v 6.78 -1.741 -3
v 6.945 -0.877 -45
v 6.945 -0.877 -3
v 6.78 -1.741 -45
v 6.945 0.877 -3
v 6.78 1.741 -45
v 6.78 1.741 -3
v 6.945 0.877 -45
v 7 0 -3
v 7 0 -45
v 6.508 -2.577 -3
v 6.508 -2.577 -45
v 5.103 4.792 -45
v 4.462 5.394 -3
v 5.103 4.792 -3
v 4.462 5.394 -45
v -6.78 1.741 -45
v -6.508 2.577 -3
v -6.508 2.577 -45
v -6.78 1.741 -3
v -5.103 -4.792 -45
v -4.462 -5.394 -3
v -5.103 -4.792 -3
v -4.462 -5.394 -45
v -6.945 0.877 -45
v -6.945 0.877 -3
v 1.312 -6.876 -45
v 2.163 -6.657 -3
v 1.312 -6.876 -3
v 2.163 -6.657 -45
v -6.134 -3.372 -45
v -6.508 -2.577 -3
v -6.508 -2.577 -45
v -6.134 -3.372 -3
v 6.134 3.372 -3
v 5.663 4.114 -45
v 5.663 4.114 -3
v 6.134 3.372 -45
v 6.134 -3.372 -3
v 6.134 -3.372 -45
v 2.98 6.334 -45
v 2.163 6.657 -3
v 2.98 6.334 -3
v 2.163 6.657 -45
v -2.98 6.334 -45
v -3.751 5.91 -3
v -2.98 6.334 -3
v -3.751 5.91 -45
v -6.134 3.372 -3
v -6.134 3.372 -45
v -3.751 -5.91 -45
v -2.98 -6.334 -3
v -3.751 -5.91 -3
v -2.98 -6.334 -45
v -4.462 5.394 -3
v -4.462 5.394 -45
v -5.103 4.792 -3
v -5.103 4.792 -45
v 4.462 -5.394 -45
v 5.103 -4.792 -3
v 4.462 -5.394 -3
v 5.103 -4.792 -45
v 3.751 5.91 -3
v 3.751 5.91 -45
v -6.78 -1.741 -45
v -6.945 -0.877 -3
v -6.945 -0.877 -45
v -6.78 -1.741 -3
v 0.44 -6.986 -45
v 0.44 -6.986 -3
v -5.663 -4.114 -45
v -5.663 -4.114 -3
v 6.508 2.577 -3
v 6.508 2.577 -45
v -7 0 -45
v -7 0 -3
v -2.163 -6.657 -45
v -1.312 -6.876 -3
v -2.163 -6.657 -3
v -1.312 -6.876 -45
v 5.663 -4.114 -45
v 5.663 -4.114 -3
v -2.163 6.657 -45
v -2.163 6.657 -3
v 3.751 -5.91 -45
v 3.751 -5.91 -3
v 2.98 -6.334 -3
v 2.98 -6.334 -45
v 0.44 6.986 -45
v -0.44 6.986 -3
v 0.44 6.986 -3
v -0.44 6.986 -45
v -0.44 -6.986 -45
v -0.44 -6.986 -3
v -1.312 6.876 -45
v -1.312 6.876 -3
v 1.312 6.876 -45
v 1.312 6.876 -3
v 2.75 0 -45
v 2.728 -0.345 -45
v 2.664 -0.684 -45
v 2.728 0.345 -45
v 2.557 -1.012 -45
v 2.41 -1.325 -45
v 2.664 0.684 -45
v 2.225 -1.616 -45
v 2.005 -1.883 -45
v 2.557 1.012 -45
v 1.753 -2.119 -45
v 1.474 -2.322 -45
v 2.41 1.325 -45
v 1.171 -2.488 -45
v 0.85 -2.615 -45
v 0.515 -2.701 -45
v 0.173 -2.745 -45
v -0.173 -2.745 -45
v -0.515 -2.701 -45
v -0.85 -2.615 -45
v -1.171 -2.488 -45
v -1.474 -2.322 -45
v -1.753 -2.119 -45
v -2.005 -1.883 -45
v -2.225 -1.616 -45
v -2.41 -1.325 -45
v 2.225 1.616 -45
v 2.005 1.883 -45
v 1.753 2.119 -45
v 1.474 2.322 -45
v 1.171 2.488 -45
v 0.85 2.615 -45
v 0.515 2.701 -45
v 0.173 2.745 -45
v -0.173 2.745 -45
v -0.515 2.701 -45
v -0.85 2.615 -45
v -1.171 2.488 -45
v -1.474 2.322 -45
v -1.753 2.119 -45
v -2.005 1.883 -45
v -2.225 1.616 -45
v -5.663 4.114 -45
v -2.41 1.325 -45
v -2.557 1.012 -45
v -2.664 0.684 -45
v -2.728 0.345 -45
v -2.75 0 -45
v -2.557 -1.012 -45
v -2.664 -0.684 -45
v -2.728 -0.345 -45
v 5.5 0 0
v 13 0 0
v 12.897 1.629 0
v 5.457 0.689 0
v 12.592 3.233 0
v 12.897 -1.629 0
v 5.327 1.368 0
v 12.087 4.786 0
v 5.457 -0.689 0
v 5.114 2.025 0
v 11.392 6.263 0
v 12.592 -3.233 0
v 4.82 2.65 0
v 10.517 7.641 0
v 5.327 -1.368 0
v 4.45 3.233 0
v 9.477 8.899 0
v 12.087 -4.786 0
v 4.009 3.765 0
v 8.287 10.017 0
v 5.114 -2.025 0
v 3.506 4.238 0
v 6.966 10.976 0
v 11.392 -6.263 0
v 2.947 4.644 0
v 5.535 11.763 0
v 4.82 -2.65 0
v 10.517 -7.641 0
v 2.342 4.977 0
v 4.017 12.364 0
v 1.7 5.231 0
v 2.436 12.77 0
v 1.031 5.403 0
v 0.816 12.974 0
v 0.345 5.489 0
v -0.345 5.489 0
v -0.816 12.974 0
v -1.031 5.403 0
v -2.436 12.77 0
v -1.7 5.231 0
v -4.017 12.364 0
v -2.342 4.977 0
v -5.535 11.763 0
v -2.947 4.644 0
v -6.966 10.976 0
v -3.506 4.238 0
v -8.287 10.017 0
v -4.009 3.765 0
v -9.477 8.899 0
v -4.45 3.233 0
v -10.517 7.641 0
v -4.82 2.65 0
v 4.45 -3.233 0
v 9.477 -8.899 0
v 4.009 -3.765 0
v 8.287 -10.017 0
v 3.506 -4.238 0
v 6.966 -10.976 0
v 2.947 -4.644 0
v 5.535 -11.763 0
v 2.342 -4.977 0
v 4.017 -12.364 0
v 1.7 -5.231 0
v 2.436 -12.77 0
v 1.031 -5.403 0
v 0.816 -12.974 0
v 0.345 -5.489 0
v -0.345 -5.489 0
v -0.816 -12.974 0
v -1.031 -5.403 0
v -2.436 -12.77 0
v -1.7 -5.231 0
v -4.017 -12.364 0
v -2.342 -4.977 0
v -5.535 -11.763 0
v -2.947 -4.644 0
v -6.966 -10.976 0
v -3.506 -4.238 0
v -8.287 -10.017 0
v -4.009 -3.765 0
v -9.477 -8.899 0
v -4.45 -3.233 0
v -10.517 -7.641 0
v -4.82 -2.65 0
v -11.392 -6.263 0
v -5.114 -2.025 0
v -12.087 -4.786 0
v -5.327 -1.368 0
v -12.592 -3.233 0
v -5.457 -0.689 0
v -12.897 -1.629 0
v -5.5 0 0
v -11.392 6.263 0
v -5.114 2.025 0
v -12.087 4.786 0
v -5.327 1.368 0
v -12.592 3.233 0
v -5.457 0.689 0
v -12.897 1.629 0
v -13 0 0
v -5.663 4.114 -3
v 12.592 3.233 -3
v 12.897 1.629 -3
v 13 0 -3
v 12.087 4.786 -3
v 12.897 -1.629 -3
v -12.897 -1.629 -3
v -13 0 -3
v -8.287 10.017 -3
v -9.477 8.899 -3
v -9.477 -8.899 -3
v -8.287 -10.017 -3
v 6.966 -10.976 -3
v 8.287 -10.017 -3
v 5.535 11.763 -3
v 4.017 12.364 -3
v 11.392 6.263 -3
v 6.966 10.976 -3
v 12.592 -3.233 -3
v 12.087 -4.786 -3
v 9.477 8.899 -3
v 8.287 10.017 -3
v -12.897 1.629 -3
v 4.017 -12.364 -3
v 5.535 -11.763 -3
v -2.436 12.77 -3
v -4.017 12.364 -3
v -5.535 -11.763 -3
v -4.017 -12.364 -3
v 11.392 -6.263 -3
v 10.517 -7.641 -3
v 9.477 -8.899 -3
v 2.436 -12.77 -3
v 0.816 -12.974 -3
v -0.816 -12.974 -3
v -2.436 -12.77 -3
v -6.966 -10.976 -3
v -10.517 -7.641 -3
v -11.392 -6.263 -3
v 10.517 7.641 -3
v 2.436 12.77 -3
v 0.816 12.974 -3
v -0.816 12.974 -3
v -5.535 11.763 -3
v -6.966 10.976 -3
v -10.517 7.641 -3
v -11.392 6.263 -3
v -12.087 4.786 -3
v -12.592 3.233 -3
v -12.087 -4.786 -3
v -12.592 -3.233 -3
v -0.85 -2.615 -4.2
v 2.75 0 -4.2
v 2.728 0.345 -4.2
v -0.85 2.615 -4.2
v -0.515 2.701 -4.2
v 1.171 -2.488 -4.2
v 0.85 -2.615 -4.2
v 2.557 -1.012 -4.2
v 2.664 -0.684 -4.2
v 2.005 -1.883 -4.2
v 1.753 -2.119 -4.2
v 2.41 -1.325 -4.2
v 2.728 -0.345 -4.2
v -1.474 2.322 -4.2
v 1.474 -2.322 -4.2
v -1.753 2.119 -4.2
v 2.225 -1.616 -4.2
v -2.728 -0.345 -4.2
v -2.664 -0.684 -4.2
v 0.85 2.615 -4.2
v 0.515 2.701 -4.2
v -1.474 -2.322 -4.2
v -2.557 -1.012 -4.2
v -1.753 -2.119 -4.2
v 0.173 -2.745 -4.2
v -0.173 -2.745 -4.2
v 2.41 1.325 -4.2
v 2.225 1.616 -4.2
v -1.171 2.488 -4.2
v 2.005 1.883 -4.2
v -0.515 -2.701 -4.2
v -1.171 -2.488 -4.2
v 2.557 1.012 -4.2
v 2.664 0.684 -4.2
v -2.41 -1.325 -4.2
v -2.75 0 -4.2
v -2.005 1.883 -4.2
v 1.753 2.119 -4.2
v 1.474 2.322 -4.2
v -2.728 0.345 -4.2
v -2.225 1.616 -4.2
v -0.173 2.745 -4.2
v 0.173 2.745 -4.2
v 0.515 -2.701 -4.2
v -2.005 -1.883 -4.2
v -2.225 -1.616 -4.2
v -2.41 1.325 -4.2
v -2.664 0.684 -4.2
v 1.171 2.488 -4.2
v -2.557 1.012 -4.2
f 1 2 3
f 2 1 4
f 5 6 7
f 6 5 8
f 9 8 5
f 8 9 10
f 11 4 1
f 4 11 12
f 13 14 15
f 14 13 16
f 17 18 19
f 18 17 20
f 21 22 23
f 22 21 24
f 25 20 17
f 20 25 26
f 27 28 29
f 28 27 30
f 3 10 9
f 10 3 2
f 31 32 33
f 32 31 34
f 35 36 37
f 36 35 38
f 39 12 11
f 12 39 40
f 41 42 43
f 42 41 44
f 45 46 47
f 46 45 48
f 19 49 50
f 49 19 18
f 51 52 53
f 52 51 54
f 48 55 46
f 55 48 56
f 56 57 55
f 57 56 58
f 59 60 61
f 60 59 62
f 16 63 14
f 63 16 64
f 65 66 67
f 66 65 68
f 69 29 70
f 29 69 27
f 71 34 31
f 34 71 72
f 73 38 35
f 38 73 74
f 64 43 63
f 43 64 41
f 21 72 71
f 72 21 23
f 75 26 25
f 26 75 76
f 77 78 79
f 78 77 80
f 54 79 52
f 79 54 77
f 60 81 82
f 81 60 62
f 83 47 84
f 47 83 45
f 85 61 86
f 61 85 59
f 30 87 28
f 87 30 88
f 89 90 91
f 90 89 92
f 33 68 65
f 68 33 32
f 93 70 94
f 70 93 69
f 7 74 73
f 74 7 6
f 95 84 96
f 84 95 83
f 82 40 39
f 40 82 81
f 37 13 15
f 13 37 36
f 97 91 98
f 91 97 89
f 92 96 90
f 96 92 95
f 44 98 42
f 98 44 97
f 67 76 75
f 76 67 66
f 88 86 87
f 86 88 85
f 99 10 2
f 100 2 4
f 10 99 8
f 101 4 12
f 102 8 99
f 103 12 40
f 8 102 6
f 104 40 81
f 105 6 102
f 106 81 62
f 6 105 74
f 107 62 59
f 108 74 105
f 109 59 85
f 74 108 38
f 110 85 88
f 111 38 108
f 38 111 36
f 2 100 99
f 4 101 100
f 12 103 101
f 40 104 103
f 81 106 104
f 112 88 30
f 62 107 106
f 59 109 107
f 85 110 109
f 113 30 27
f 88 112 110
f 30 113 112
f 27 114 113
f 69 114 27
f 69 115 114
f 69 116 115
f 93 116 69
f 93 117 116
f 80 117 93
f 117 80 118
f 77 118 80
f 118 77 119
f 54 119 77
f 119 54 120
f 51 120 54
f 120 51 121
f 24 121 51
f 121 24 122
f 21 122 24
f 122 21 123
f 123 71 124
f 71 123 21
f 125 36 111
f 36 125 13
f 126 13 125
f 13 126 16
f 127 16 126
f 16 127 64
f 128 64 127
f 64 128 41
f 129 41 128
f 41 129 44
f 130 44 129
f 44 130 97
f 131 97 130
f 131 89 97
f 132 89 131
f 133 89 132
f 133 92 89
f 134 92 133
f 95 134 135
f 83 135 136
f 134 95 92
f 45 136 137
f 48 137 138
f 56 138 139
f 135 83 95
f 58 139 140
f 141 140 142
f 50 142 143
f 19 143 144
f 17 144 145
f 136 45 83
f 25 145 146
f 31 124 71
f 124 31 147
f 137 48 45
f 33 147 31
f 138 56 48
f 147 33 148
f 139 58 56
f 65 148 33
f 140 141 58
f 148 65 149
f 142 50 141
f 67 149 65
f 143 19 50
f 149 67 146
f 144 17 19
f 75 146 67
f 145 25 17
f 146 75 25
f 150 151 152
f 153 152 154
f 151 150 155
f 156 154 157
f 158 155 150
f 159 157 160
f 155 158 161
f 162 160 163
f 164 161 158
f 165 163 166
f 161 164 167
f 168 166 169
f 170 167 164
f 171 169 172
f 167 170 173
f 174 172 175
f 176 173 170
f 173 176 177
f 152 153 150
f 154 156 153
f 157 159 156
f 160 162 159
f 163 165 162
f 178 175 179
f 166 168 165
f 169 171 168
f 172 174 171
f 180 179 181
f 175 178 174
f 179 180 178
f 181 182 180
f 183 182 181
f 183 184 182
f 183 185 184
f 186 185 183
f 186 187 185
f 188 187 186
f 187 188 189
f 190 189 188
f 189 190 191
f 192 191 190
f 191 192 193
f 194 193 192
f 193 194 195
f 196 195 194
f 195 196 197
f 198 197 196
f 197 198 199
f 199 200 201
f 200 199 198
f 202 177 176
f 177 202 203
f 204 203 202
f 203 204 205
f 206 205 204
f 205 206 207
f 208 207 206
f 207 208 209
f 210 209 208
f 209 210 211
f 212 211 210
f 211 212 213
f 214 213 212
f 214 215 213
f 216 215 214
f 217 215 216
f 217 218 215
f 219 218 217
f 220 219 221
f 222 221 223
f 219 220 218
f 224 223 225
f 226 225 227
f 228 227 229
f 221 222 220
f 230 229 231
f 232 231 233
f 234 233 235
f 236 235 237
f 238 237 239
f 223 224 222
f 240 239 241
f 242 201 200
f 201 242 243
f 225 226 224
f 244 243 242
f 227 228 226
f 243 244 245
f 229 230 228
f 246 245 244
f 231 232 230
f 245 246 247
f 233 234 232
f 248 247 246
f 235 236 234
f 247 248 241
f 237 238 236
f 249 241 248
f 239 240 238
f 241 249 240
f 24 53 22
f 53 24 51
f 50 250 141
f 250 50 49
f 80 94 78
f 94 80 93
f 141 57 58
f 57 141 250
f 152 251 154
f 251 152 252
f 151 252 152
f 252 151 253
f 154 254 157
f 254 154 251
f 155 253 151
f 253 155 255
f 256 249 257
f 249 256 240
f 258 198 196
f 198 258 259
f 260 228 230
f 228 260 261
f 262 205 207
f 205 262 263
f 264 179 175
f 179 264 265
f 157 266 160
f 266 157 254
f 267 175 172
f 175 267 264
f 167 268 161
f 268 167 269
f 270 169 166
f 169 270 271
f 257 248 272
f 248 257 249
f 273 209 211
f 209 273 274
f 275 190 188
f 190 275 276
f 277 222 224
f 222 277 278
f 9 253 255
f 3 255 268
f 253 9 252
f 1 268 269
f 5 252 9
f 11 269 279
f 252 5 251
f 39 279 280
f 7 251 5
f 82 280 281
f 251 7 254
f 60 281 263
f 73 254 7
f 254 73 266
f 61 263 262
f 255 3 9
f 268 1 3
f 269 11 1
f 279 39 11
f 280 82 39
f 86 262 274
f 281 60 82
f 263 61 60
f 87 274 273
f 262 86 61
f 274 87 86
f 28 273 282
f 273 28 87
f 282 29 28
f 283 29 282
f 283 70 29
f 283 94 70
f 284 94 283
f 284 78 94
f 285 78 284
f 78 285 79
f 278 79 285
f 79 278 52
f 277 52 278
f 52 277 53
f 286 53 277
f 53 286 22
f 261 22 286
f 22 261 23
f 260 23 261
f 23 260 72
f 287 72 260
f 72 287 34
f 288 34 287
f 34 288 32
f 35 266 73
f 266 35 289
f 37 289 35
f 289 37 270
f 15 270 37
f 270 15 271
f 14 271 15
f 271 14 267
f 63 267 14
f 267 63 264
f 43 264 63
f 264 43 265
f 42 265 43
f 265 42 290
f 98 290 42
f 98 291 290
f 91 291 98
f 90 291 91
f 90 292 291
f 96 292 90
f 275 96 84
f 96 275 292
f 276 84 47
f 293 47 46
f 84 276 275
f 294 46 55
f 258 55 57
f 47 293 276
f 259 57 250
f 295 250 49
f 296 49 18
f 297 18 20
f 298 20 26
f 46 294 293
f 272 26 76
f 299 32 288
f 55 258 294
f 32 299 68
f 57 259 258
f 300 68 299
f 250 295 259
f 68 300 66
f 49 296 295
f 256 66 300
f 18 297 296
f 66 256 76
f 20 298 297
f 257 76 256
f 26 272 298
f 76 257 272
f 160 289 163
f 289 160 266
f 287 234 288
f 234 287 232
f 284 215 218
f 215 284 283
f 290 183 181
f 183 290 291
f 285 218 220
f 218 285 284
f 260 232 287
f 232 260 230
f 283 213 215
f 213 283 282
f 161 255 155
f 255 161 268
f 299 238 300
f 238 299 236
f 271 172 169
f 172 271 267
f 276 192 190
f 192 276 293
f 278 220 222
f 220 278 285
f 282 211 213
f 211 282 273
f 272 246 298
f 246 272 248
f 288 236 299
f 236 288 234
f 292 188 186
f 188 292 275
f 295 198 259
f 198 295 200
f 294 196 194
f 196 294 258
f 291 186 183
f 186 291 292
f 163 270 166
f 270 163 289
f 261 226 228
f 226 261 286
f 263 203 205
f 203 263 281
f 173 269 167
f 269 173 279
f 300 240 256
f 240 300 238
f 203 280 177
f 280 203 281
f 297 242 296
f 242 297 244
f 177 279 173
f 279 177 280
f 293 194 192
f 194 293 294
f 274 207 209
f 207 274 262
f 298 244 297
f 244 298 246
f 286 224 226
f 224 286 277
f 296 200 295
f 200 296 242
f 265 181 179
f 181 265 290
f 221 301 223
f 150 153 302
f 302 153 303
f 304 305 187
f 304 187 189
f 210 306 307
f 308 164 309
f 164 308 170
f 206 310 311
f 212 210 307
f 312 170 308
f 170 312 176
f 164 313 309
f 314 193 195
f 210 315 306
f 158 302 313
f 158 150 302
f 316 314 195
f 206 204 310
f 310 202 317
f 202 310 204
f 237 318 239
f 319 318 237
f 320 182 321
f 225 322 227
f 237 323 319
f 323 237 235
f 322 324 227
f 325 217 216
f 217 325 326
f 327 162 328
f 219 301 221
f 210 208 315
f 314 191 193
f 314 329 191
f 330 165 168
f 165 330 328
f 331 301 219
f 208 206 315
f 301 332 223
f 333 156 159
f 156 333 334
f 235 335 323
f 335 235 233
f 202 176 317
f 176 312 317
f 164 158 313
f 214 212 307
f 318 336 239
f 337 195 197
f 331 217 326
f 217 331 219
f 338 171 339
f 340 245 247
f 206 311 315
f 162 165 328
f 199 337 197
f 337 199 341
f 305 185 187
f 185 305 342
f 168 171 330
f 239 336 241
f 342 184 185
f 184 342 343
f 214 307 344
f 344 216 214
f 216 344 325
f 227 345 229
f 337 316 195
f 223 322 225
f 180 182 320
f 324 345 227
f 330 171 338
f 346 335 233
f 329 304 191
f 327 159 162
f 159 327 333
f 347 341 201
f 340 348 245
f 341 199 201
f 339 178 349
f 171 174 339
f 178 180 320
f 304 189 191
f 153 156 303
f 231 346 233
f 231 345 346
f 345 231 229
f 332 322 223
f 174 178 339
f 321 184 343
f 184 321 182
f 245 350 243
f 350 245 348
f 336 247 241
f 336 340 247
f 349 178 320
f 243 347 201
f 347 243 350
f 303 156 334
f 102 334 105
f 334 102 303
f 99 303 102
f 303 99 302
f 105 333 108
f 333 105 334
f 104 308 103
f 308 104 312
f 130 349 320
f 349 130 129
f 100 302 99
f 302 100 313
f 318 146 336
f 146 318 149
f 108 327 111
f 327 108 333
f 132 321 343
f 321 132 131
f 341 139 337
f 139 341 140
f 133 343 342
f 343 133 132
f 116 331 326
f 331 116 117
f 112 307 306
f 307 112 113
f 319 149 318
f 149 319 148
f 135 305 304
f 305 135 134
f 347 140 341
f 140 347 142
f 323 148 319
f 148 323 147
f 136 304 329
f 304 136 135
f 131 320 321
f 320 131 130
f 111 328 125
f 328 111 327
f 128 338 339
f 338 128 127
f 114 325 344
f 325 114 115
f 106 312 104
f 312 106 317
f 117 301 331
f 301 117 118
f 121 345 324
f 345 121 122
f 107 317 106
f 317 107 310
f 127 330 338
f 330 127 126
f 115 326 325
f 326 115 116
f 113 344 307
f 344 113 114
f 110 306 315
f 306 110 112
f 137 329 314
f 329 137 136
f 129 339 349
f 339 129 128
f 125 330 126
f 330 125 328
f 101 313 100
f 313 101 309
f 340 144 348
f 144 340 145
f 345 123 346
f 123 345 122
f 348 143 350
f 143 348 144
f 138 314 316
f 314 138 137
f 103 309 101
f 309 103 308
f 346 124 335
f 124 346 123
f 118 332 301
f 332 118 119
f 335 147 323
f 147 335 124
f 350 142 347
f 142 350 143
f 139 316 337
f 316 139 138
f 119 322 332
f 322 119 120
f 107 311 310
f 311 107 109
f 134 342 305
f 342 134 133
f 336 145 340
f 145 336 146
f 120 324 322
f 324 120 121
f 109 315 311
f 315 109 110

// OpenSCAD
$fn = 50;


difference() {
	union() {
		translate(v = [0, 0, -45.0000000000]) {
			cylinder(h = 45, r = 7.0000000000);
		}
		translate(v = [0, 0, -3.0000000000]) {
			cylinder(h = 3, r = 13.0000000000);
		}
	}
	union() {
		translate(v = [0, 0, 0]) {
			rotate(a = [0, 0, 0]) {
				difference() {
					union() {
						#translate(v = [0, 0, -45.0000000000]) {
							cylinder(h = 45, r = 2.2500000000);
						}
						#translate(v = [0, 0, -4.2000000000]) {
							cylinder(h = 4.2000000000, r = 7.0000000000, r1 = 2.7500000000, r2 = 5.5000000000);
						}
						#translate(v = [0, 0, -45.0000000000]) {
							cylinder(h = 45, r = 2.7500000000);
						}
						#translate(v = [0, 0, -45.0000000000]) {
							cylinder(h = 45, r = 2.2500000000);
						}
					}
					union();
				}
			}
		}
	}
}
